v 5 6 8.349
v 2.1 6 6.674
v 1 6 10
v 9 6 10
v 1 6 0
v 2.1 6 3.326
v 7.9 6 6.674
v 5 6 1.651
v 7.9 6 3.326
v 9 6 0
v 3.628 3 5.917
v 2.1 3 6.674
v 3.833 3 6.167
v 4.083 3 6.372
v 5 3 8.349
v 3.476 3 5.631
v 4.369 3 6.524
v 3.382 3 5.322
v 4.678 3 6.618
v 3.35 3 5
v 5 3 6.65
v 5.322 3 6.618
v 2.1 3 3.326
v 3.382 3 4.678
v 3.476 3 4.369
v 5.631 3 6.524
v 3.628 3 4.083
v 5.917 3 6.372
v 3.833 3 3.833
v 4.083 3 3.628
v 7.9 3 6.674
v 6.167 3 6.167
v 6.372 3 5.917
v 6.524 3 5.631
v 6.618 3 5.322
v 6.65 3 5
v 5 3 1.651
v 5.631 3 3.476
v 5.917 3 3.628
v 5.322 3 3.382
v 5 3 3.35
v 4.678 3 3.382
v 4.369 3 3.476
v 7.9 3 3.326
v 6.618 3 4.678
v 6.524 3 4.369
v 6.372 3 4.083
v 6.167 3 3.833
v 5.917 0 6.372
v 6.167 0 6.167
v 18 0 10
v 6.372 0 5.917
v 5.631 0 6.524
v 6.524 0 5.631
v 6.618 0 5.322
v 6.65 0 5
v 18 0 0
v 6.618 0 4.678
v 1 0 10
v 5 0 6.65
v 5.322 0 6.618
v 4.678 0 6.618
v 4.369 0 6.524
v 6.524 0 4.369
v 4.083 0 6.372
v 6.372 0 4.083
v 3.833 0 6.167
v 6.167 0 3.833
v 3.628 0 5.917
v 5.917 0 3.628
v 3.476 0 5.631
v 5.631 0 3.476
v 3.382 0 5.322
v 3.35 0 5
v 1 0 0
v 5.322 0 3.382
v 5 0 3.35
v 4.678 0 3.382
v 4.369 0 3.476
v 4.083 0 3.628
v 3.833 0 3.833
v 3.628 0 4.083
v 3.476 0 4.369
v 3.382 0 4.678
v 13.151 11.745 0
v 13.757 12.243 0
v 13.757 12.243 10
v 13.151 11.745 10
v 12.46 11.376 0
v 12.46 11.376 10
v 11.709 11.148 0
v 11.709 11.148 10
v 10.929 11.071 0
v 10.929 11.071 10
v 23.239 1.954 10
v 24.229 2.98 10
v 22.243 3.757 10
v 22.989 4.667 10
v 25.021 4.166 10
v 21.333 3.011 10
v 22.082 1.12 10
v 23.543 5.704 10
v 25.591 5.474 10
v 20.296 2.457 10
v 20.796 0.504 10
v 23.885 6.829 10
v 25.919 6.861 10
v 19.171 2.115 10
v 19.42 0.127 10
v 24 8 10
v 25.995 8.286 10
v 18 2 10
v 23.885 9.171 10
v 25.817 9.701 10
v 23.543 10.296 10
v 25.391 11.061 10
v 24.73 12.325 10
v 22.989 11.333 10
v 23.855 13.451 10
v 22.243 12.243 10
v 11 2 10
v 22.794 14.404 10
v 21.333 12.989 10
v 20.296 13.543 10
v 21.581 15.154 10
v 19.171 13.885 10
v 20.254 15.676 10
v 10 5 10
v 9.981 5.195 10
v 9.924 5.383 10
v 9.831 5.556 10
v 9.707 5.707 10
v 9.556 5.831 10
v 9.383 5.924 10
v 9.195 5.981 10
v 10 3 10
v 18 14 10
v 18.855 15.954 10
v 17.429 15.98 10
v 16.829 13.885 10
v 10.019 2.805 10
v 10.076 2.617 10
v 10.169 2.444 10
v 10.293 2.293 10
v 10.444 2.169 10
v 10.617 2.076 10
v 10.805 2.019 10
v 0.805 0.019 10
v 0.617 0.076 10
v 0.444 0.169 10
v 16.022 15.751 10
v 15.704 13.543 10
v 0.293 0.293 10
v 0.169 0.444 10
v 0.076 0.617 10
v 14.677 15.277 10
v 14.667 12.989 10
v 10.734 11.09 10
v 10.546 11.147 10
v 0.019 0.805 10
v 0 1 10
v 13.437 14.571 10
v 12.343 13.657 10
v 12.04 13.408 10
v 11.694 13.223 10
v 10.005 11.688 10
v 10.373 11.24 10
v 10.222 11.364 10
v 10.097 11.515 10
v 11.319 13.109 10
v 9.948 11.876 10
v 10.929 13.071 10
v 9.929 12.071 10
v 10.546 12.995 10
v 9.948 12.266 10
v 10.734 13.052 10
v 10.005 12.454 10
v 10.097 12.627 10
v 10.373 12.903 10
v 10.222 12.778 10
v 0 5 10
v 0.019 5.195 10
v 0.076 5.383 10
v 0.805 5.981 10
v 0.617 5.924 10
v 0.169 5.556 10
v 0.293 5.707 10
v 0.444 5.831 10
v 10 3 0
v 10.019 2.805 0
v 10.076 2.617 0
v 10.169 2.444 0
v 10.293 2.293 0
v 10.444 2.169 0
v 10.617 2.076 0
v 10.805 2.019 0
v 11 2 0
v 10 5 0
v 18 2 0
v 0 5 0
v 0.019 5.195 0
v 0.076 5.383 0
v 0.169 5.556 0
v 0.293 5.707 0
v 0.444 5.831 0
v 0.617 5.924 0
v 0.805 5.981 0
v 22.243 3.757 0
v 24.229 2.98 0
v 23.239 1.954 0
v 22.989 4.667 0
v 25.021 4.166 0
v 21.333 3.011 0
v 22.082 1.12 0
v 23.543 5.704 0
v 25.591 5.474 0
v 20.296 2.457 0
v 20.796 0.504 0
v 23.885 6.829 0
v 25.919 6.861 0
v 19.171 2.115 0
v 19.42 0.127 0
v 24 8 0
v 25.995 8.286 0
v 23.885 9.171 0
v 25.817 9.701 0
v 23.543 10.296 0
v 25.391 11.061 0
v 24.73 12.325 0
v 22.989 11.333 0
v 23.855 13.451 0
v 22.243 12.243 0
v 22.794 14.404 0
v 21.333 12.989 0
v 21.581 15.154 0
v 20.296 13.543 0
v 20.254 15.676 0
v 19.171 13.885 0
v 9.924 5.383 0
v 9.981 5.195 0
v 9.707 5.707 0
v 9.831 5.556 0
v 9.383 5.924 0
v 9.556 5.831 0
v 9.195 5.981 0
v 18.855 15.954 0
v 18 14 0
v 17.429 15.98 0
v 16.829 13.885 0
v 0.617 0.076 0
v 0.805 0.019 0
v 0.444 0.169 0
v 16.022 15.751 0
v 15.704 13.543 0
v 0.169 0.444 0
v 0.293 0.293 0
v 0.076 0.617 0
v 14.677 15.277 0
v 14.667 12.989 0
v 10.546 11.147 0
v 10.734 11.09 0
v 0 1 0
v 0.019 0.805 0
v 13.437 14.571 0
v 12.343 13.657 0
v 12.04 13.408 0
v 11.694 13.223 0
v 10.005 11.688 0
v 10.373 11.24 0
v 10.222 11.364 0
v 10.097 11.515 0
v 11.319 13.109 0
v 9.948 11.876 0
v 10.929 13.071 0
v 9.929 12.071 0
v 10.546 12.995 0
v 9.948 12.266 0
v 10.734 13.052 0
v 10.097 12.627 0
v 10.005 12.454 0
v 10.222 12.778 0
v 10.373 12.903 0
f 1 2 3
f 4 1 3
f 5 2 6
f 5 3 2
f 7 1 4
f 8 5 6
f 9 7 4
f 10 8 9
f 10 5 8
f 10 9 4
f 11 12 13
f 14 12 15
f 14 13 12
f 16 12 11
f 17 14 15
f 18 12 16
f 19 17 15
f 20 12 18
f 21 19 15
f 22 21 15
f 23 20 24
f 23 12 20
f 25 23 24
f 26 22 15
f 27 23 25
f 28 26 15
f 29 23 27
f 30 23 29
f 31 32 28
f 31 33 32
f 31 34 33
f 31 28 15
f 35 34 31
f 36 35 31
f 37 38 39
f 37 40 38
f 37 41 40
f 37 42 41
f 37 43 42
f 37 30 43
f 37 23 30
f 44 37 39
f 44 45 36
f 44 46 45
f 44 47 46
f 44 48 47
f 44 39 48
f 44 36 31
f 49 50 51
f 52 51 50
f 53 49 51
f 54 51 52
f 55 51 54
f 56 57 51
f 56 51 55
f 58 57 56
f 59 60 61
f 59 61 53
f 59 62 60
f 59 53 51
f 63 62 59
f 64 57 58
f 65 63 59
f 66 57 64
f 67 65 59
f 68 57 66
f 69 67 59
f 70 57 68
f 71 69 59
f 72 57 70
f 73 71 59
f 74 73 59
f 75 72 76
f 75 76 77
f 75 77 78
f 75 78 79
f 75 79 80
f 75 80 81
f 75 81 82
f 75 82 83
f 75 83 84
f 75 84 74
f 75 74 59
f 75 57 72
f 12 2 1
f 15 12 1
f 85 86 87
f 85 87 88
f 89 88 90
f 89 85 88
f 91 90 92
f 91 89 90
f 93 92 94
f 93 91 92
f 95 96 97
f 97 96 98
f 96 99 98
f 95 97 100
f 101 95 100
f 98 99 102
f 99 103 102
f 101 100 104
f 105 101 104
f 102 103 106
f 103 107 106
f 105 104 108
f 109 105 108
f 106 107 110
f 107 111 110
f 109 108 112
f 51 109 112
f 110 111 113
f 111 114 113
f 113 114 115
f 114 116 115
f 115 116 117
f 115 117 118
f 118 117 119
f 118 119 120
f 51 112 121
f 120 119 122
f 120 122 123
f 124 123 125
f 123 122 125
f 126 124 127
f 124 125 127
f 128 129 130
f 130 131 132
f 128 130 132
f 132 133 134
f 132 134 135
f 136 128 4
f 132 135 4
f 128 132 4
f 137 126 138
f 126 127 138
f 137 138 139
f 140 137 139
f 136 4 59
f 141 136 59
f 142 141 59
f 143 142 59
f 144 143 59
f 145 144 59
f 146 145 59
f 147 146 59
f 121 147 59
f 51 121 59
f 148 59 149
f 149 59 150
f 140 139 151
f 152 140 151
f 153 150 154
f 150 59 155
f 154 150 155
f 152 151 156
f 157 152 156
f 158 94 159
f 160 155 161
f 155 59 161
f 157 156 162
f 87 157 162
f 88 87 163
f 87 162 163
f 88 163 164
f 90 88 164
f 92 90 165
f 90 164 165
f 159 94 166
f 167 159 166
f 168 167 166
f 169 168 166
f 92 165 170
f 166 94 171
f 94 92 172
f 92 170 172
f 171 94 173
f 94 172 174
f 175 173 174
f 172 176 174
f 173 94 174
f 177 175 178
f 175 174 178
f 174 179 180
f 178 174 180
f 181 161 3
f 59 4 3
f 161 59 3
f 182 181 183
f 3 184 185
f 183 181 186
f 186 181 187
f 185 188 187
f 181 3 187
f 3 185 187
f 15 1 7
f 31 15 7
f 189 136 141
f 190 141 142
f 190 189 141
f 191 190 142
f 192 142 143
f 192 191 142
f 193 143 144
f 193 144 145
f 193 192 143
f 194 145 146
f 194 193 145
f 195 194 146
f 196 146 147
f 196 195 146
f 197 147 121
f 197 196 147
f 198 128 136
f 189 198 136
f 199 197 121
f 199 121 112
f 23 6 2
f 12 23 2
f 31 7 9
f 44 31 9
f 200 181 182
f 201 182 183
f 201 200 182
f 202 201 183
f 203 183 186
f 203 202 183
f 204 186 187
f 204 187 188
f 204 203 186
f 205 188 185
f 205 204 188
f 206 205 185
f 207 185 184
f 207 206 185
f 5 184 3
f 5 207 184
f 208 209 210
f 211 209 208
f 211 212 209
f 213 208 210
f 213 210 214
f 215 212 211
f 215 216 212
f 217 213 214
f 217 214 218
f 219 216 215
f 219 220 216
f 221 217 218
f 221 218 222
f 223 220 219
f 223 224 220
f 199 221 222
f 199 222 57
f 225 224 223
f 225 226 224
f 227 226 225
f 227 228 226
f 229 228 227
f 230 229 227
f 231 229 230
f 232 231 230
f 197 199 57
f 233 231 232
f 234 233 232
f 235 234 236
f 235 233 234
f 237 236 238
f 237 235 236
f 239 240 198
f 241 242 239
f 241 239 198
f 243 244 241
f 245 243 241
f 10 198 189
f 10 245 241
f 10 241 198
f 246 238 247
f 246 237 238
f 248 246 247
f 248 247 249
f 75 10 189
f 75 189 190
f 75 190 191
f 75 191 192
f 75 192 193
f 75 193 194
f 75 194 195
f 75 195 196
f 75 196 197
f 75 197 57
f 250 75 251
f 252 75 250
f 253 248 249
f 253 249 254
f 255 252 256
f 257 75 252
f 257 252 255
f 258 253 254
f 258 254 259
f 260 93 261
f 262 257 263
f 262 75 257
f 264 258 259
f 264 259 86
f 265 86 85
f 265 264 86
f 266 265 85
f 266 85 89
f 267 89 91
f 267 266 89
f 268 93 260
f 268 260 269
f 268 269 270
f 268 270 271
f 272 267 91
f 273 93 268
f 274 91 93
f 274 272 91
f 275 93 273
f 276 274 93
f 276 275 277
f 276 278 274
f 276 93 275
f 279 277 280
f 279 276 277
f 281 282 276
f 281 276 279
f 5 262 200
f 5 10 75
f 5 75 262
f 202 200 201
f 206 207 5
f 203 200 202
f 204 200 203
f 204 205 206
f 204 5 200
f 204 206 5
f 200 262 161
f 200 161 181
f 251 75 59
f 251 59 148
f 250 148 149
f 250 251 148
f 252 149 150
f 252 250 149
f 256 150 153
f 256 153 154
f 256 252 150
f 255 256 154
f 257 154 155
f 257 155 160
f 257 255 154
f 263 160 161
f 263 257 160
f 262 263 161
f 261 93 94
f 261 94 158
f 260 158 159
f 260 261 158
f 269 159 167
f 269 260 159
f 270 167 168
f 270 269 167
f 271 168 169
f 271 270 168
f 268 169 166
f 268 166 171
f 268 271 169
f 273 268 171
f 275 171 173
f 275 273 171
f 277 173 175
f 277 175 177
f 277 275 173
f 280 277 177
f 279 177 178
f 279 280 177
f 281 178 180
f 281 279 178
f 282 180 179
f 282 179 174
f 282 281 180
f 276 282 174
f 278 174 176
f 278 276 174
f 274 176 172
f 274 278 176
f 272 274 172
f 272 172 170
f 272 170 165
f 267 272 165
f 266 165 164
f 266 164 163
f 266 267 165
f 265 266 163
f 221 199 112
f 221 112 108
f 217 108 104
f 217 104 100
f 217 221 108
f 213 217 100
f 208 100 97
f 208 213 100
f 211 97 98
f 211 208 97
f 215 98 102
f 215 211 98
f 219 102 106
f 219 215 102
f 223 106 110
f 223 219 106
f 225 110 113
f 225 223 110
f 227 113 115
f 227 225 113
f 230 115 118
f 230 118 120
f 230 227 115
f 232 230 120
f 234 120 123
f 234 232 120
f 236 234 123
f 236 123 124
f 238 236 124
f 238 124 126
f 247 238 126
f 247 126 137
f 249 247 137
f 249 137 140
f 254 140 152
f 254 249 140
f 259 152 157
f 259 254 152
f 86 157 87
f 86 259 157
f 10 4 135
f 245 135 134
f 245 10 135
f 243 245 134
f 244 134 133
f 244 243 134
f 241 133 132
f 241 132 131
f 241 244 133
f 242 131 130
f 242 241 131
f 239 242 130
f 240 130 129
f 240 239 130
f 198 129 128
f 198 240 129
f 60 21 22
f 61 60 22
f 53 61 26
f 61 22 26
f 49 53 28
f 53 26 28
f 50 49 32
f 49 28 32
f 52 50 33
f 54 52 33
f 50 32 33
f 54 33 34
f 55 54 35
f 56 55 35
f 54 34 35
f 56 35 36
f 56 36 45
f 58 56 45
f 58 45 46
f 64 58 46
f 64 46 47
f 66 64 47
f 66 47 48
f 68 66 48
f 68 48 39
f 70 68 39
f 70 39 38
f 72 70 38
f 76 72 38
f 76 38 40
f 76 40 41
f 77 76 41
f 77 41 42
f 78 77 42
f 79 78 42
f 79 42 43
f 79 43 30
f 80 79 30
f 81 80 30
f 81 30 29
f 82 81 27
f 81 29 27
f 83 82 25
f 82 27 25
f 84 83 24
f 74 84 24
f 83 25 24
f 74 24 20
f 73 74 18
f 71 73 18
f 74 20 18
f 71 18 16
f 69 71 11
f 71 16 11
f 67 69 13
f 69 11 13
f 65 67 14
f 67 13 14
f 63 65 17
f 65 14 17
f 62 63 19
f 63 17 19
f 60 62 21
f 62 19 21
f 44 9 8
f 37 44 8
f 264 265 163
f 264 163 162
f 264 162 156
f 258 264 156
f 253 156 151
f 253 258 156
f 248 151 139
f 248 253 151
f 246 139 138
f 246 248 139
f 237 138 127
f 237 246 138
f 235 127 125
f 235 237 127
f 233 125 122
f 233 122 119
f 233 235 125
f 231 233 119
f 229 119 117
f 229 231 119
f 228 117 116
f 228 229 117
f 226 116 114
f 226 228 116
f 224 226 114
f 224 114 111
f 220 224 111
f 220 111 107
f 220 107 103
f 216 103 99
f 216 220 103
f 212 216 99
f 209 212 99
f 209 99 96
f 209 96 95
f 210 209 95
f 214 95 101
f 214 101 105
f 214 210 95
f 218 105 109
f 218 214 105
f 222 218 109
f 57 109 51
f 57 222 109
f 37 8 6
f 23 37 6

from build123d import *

# Parameters (mm, degrees)
BOSS_EXTRUDE1_DEPTH = 10
CUT_EXTRUDE1_DEPTH  = 3
SKETCH3_R           = 1.65
CUT_EXTRUDE2_DEPTH  = 6


with BuildPart() as part:
    # Sketch1 → Boss-Extrude1 (new body)
    with BuildSketch(Plane.XY):
        with BuildLine():
            Line((0, 1), (0, 5))
            ThreePointArc((0, 5), (0.292893219, 5.707106781), (1, 6))
            Line((1, 6), (9, 6))
            ThreePointArc((9, 6), (9.707106781, 5.707106781), (10, 5))
            Line((10, 5), (10, 3))
            ThreePointArc((10, 3), (10.292893219, 2.292893219), (11, 2))
            Line((11, 2), (18, 2))
            ThreePointArc((18, 2), (23.543277195, 10.296100594), (13.757359313, 12.242640687))
            ThreePointArc((13.757359313, 12.242640687), (12.459665918, 11.375549682), (10.928932188, 11.071067812))
            ThreePointArc((10.928932188, 11.071067812), (9.928932188, 12.071067812), (10.928932188, 13.071067812))
            ThreePointArc((10.928932188, 13.071067812), (11.694299053, 13.223308747), (12.343145751, 13.656854249))
            ThreePointArc((12.343145751, 13.656854249), (25.39103626, 11.061467459), (18, 0))
            Line((18, 0), (1, 0))
            ThreePointArc((1, 0), (0.292893219, 0.292893219), (0, 1))
        make_face()
    extrude(amount=BOSS_EXTRUDE1_DEPTH)

    # Sketch2 → Cut-Extrude1 (cut)
    with BuildSketch(Plane(origin=(0, 6, 0), x_dir=(1, 0, 0), z_dir=(0, 1, 0))):
        Polygon((5, -1.651368439), (2.1, -3.325684219), (2.1, -6.674315781), (5, -8.348631561), (7.9, -6.674315781), (7.9, -3.325684219), align=None)
    extrude(amount=-CUT_EXTRUDE1_DEPTH, mode=Mode.SUBTRACT)

    # Sketch3 → Cut-Extrude2 (cut)
    with BuildSketch(Plane(origin=(0, 6, 0), x_dir=(1, 0, 0), z_dir=(0, 1, 0))):
        with Locations(Location((5, -5, 0), (0, 0, 270))):
            Circle(SKETCH3_R)
    extrude(amount=-CUT_EXTRUDE2_DEPTH, mode=Mode.SUBTRACT)


solid = part.part
